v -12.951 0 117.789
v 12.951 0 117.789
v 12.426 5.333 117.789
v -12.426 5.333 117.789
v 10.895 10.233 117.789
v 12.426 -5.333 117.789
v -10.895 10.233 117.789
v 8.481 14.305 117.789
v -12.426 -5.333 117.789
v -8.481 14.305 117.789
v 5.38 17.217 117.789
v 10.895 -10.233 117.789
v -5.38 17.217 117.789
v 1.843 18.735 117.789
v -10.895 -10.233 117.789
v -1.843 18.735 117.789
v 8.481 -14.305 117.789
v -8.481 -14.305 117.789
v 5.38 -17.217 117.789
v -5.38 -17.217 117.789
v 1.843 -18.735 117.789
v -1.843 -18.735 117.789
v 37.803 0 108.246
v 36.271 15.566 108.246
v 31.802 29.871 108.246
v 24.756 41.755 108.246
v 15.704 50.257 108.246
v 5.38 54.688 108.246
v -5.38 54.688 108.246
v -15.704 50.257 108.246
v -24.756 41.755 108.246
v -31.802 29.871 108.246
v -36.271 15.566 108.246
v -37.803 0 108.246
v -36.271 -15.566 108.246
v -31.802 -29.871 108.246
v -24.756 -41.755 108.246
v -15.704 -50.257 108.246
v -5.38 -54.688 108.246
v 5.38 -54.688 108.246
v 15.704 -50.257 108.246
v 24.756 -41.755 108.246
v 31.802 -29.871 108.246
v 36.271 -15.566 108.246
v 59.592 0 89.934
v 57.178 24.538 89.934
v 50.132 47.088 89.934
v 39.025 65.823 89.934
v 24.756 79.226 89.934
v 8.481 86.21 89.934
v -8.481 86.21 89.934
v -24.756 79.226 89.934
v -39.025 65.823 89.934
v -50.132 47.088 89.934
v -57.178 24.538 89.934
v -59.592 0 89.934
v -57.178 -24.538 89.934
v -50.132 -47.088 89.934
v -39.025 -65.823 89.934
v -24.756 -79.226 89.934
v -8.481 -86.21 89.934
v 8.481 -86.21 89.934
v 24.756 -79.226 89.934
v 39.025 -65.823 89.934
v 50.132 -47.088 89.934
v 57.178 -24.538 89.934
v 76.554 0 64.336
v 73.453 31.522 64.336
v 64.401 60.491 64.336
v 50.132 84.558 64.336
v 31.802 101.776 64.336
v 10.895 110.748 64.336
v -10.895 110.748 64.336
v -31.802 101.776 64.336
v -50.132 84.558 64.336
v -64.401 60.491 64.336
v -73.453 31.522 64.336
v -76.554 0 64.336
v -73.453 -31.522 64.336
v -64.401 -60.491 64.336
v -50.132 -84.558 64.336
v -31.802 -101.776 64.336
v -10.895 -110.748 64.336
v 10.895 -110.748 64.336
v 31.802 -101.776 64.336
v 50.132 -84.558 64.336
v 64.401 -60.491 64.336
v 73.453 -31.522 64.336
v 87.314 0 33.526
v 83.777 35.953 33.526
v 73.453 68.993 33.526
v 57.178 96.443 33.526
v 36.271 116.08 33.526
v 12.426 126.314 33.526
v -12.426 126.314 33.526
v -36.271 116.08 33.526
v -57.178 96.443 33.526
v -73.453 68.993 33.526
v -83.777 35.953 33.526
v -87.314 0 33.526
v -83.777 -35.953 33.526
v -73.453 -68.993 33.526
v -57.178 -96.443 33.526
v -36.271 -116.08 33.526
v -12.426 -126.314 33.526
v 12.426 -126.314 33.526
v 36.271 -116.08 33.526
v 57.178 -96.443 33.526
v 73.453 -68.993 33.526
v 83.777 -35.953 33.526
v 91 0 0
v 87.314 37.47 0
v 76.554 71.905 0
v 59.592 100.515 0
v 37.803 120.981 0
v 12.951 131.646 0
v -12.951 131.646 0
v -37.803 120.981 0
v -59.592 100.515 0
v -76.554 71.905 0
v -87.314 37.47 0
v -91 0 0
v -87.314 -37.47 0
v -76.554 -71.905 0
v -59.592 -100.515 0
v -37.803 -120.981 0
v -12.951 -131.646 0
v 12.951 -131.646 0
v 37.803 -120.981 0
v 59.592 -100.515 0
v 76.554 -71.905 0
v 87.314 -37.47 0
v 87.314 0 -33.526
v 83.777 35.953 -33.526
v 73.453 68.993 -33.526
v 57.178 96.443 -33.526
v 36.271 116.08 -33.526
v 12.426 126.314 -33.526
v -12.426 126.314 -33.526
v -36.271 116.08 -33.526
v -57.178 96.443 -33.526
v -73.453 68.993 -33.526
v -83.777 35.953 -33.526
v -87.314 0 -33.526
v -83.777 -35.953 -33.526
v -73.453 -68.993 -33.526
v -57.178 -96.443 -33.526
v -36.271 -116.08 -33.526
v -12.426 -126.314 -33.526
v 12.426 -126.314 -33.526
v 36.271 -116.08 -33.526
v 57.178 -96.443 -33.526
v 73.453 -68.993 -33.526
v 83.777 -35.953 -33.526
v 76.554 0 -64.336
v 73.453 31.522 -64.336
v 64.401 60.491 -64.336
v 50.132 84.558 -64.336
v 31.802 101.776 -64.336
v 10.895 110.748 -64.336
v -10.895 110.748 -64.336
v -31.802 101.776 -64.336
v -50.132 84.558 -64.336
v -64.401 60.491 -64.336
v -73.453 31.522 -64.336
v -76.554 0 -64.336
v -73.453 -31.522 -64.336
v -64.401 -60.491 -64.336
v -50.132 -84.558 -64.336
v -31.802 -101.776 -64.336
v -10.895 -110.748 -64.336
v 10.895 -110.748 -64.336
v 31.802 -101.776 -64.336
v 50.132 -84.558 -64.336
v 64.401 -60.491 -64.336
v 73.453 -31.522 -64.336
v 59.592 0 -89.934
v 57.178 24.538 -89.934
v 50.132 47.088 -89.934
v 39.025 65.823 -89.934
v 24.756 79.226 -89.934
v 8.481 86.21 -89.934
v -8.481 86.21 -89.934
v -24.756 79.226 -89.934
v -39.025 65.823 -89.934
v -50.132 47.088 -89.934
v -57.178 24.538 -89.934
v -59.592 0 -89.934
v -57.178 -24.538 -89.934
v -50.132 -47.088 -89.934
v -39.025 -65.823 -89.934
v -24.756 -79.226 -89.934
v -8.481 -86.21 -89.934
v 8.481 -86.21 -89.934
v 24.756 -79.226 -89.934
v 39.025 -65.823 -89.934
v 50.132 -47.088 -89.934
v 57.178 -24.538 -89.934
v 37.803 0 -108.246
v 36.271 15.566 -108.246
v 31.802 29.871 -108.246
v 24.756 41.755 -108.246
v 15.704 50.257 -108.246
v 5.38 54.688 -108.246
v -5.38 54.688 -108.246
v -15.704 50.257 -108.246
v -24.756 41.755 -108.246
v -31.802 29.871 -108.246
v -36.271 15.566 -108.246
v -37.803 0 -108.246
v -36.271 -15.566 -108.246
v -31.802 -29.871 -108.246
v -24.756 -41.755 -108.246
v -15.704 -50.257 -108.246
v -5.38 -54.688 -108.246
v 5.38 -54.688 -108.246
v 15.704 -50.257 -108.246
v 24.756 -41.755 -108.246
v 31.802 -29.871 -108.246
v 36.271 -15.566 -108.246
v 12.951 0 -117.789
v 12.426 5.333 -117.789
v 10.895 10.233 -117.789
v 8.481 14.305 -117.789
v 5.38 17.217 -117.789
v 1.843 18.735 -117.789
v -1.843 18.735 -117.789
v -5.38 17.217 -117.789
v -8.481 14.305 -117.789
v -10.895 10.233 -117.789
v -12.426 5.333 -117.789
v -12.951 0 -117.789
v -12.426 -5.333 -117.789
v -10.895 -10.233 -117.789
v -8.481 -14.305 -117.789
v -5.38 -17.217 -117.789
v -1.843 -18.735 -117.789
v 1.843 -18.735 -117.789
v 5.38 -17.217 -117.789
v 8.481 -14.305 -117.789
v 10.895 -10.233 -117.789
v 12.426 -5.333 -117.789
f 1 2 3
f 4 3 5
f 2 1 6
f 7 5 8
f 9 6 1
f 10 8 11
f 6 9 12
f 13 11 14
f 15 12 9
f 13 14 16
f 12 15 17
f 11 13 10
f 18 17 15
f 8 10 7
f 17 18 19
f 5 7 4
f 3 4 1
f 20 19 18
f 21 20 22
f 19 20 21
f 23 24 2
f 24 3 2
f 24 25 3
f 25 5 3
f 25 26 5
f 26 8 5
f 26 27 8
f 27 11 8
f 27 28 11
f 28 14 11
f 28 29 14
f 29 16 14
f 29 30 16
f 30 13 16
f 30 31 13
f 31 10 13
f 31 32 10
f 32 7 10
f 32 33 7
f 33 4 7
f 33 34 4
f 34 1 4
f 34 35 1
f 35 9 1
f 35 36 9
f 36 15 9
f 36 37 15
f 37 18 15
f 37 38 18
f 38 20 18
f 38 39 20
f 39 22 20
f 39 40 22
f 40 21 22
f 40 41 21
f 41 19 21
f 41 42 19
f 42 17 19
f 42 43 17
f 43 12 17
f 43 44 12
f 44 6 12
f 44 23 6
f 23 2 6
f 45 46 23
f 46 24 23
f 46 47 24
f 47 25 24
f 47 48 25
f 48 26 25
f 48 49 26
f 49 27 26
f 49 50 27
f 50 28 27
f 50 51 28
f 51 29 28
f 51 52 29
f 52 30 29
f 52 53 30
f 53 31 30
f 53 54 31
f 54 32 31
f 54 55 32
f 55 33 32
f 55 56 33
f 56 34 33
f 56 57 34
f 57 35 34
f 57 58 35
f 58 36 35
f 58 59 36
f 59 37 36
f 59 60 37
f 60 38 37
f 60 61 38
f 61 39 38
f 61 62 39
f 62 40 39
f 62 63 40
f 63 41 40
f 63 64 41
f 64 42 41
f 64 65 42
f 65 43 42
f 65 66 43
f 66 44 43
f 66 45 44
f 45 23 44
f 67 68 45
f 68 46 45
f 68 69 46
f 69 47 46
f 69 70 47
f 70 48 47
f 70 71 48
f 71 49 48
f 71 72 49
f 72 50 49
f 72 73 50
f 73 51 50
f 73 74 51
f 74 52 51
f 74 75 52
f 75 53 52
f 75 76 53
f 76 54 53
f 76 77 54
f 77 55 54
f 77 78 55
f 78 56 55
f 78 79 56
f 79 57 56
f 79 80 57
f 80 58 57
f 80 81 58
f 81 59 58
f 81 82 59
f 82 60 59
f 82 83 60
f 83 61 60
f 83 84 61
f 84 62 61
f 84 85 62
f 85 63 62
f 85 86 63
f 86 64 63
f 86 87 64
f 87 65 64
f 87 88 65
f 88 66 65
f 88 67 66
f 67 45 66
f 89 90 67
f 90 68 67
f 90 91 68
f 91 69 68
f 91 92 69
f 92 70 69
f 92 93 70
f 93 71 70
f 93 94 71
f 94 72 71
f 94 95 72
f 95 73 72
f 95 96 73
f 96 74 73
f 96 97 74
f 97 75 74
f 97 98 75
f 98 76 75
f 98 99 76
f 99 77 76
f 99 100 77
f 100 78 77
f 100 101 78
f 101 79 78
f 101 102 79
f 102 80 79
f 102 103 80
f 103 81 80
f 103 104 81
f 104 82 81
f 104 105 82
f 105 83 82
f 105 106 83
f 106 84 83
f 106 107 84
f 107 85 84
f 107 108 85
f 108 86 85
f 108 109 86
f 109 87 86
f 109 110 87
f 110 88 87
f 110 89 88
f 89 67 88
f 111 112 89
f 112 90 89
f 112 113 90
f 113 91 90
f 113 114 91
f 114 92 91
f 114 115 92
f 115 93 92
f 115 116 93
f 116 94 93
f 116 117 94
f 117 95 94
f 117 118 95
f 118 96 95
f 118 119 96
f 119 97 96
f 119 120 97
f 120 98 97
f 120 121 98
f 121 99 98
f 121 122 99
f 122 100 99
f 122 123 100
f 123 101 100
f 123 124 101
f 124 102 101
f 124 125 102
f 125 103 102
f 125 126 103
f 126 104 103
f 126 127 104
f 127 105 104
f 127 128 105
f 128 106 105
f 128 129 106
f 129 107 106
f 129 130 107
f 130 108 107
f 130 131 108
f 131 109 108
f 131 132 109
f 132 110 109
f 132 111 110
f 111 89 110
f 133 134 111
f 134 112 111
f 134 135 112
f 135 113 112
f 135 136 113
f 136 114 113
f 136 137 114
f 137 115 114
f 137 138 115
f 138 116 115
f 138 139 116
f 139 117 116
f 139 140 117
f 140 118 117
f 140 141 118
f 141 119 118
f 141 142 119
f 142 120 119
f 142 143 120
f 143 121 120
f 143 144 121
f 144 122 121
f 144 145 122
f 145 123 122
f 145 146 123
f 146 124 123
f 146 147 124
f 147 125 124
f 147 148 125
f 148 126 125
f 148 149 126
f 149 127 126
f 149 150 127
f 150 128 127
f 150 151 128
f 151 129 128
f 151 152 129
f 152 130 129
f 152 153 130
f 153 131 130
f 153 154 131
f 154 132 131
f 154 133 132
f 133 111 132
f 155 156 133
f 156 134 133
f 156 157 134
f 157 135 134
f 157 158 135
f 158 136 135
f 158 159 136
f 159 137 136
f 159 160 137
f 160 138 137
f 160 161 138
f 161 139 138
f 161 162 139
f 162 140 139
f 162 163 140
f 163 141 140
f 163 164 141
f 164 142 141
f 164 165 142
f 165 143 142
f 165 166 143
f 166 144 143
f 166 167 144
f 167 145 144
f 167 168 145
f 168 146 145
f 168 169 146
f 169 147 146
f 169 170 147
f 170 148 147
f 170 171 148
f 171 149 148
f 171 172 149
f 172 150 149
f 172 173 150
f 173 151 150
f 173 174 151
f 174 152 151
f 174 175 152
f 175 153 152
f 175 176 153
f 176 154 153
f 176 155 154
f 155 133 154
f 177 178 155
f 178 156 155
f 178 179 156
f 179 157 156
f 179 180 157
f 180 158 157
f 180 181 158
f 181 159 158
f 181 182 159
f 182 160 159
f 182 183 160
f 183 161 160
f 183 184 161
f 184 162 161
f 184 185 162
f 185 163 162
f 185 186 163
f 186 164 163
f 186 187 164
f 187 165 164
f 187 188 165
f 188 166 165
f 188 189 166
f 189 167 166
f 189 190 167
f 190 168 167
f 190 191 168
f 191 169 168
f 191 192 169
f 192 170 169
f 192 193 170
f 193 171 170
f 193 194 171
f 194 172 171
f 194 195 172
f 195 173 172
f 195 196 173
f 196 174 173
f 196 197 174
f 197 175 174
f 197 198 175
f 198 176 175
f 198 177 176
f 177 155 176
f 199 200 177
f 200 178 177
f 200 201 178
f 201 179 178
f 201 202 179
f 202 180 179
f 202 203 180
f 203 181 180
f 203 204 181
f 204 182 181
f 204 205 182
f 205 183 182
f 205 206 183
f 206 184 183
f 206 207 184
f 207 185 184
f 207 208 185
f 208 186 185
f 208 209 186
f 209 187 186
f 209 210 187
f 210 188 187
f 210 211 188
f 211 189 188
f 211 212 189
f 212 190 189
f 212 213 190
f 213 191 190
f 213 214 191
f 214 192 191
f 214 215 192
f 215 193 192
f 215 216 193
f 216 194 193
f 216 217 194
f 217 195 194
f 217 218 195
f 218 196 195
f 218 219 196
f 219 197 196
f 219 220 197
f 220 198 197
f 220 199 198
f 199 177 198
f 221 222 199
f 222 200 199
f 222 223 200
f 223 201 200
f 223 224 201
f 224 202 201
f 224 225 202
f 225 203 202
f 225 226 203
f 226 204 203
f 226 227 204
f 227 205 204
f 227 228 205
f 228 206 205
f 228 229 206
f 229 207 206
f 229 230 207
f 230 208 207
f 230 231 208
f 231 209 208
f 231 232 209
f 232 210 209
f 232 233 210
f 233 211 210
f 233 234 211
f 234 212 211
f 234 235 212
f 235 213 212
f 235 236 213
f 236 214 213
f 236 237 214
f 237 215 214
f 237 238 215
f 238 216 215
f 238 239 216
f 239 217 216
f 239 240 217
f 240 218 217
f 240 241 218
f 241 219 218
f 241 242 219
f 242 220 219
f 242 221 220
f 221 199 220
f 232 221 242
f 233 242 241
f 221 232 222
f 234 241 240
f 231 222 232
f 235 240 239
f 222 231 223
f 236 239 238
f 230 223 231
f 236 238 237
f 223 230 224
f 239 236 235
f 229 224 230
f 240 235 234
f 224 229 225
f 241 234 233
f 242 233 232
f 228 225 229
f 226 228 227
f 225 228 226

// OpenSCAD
// Generated by SolidPython 1.0.1 on 2020-07-29 00:46:51


scale(v = [13, 19, 17]) {
	sphere(r = 7);
}
/***********************************************
*********      SolidPython code:      **********
************************************************
 
# import packages: SolidPython
from solid import *
from solid.utils import *
from itertools import chain, combinations, permutations


class Resize:

    def __init__(self, scad_file):
        self.scad_file = scad_file
        #self.scad_file = import_scad(scad_file)
        # cone/cylinder param:
        self.r1 = 0
        self.r2 = 0
        self.h = 0
        # rectangular prism param:
        self.w = 0
        self.l = 0
        # ellipse param:
        self.r = 0

    # import OpenScad code (file name corresponds to shape)


    # classify shape + parameters
    def assign(self, param1, param2, param3):
        if self.scad_file == 'cone.scad':
            self.r1 = param1
            self.r2 = param2
            self.h = param3
        elif self.scad_file == 'cylinder.scad':
            self.r1 = param1
            self.r2 = param2
            self.h = param3
        elif self.scad_file == 'rectangularPrism.scad':
            self.h = param1
            self.l = param2
            self.w = param3
        else:
            self.r = param1
            self.h = param2

    # resize parameters
    def iterate(self):
        x = range(3, 20, 2)
        i = 1
        if self.scad_file == 'cone.scad':
            tempList = list(permutations(x, 2))
            for temp in tempList:
                param1 = temp[0]
                param2 = temp[1]
                filepath = 'produced_scad_files/' + 'cone' + str(param1) + '_' + str(param2) + '_' + '.scad'
                scad_render_to_file(cylinder(h=param1, r1=param2, r2=0), filepath)

        elif self.scad_file == 'cylinder.scad':
            tempList = list(permutations(x, 3))
            for temp in tempList:
                param1 = temp[0]
                param2 = temp[1]
                filepath = 'produced_scad_files/' + 'cylinder' + str(param1) + '_' + str(param2) + '_' + '.scad'
                scad_render_to_file(cylinder(h=param1, r1=param2, r2=param2), filepath)

        elif self.scad_file == 'rectangularPrism.scad':
            tempList = list(permutations(x, 3))
            for temp in tempList:
                param1 = temp[0]
                param2 = temp[1]
                param3 = temp[2]
                filepath = 'produced_scad_files/' + 'rectangularPrism' + str(param1) + '_' + str(param2) + '_' + str(
                    param3) + '.scad'
                scad_render_to_file(cube(size=(param1, param2, param3)), filepath)

        elif self.scad_file == 'ellipse.scad':
            tempList = list(permutations(x, 4))
            for temp in tempList:
                param1 = temp[0]
                param2 = temp[1]
                param3 = temp[2]
                param4 = temp[3]
                filepath = 'produced_scad_files/' + 'ellipse' + str(param1) + '_' + str(param2) + '_' + str(param3) + '_' + str(param4) + '.scad'
                scad_render_to_file(scale([param1, param2, param3])(sphere(r=param4)), filepath)

    def render_to_scadfile(self):
        scad_render_to_file(scad, 'example.scad') 
 
************************************************/
